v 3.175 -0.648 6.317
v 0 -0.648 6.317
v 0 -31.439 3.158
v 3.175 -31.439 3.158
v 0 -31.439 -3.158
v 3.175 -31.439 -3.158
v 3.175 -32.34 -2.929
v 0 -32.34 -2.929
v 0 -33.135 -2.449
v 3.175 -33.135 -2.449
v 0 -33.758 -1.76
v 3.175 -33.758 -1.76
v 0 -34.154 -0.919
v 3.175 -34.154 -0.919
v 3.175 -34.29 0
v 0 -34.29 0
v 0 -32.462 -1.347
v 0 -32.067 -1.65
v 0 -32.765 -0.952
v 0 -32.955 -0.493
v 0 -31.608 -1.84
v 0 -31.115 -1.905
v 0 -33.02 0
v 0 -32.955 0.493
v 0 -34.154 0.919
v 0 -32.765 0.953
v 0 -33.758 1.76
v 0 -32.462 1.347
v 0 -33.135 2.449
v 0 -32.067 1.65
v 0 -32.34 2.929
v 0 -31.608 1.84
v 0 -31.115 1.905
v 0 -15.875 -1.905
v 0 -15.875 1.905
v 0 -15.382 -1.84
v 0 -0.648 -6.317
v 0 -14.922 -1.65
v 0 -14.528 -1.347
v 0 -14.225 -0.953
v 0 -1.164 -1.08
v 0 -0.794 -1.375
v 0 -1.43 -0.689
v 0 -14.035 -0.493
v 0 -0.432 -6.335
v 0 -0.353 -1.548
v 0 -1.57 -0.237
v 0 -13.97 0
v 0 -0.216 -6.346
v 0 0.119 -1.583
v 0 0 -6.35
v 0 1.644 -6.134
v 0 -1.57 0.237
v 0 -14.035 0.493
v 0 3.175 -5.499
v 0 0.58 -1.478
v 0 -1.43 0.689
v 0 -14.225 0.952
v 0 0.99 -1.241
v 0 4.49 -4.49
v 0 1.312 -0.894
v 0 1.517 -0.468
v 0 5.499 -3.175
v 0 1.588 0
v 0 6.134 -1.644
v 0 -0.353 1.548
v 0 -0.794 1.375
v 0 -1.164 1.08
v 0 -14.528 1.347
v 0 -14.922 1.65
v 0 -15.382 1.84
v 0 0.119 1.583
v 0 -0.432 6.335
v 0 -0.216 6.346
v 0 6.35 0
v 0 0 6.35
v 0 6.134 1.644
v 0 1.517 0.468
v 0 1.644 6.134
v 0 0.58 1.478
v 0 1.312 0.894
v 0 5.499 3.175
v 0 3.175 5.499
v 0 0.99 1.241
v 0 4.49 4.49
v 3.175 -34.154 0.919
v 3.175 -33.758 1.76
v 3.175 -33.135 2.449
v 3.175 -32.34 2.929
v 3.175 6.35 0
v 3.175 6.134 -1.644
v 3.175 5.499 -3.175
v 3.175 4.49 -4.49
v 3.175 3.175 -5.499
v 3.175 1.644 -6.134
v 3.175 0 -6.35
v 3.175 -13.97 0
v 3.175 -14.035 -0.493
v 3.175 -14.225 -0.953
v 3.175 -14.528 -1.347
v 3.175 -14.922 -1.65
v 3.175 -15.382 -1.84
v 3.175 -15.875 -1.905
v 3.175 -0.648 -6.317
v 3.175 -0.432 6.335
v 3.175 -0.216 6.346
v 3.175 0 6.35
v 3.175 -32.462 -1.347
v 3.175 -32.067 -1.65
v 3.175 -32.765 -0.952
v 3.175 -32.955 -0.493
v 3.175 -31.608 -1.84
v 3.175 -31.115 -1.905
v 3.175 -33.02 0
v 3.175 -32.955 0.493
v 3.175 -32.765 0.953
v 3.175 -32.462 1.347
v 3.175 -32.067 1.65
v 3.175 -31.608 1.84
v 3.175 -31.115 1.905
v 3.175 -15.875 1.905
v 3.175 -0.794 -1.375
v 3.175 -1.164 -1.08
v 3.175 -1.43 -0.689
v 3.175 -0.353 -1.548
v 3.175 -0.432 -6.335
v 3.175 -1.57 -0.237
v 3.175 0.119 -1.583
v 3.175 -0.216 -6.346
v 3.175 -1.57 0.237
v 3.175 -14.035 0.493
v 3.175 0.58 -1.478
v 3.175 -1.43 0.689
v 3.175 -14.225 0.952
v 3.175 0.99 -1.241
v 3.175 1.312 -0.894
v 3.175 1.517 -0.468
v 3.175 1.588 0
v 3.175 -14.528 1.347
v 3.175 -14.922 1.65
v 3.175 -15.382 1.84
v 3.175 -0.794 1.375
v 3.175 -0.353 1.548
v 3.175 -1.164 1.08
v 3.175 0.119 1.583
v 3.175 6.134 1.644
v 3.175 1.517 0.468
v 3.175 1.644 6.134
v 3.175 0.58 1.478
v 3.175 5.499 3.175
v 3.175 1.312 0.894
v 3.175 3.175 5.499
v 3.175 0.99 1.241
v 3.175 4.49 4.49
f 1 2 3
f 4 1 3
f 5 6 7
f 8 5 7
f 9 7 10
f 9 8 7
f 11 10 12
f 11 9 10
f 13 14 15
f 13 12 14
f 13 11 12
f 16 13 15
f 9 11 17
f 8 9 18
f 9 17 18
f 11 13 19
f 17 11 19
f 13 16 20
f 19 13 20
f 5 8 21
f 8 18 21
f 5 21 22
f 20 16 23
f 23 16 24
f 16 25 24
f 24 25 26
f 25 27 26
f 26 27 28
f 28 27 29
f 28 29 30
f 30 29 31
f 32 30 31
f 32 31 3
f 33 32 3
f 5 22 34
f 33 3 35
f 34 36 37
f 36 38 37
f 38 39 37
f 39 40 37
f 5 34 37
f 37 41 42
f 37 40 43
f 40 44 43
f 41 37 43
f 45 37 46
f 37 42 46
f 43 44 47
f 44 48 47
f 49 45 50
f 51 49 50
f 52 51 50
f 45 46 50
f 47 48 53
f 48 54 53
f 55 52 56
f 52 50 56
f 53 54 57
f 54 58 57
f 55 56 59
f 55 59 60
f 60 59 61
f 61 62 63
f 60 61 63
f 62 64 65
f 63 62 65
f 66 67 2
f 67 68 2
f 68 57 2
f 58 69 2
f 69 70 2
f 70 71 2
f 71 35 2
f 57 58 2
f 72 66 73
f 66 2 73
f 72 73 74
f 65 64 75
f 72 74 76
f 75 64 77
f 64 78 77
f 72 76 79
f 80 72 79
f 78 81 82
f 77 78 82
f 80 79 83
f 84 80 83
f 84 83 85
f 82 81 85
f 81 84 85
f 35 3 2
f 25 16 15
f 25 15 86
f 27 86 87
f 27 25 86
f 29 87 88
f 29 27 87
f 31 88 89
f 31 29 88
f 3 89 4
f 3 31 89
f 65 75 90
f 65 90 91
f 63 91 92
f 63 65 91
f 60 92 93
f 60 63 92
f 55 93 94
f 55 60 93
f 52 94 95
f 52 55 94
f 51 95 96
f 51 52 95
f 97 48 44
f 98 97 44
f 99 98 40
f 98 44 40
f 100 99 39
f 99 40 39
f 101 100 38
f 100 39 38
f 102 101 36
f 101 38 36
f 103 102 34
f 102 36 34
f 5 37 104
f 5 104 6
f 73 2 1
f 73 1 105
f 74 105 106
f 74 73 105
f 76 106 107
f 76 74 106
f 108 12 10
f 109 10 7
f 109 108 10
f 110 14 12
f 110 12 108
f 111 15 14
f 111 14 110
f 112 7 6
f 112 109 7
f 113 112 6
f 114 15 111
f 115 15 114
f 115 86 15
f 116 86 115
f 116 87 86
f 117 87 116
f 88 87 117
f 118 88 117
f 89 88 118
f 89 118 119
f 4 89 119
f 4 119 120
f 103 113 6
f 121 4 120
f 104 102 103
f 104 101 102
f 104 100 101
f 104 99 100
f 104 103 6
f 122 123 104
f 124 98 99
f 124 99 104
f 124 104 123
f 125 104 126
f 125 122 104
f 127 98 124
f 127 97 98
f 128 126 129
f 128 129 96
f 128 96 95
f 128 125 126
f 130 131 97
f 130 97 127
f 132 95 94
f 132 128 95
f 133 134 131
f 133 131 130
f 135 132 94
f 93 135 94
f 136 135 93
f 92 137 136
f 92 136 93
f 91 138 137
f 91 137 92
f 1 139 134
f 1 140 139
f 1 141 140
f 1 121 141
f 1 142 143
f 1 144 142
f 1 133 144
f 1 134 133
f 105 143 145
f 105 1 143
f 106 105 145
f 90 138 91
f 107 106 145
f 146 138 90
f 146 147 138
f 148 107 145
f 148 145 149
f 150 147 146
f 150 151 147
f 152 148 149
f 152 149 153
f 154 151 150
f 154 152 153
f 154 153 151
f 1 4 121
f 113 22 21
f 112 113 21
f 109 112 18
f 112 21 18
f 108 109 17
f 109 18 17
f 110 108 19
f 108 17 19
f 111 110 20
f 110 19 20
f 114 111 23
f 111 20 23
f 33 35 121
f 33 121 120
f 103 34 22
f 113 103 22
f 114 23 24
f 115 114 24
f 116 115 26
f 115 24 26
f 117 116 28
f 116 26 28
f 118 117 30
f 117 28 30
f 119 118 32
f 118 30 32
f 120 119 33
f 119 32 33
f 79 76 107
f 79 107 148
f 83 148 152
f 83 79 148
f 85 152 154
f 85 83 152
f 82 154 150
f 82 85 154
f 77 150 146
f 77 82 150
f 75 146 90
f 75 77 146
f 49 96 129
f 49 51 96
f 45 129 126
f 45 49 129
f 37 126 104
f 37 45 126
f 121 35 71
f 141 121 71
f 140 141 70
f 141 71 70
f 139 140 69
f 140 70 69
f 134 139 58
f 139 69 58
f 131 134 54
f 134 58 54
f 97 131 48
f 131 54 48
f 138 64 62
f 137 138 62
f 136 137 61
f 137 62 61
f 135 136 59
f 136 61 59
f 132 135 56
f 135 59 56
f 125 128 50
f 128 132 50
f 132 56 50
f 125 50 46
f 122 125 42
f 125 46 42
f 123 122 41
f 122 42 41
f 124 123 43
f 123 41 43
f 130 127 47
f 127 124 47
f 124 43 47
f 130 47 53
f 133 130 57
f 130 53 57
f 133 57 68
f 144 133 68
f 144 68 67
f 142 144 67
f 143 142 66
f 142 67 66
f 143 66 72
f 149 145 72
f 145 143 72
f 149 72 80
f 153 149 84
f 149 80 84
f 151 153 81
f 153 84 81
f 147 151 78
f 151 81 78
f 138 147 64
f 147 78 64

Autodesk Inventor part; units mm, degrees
ref_plane "YZ Plane" through (0, 0, 0) normal (1, 0, 0) x (0, 1, 0)
ref_plane "XZ Plane" through (0, 0, 0) normal (0, 1, 0) x (-1, 0, 0)
ref_plane "XY Plane" through (0, 0, 0) normal (0, 0, 1) x (1, 0, 0)
sketch "Sketch2" plane through (0, 0, 0) normal (1, 0, 0) x (0, 1, 0)
  arc A0 (-0.648, -6.3169) -> (-0.648, 6.3169) centre (0, 0) ccw
  line L0 (6.35, 6.35) -> (-34.29, 6.35)
  line L1 (-34.29, 6.35) -> (-34.29, -6.35)
  line L2 (-34.29, -6.35) -> (6.35, -6.35)
  line L3 (6.35, -6.35) -> (6.35, 6.35)
  circle A1 centre (0, 0) radius 1.5875
  line L4 (-34.29, 0) -> (-33.02, 0)
  arc A2 (-31.115, 1.905) -> (-31.115, -1.905) centre (-31.115, 0) ccw
  arc A3 (-31.439, 3.1584) -> (-31.439, -3.1584) centre (-31.115, 0) ccw
  line L5 (-33.02, 0) -> (-13.97, 0)
  arc A4 (-15.875, -1.905) -> (-15.875, 1.905) centre (-15.875, 0) ccw
  line L6 (-15.875, -1.905) -> (-31.115, -1.905)
  line L7 (-15.875, 1.905) -> (-31.115, 1.905)
  line L8 (-0.648, -6.3169) -> (-31.439, -3.1584)
  line L9 (-0.648, 6.3169) -> (-31.439, 3.1584)
  dimension "d16" = 12.7
  dimension "d17" = 40.64
  dimension "d18" = 3.175
  dimension "d19" = 1.27
  dimension "d20" = 3.81
  dimension "d21" = 6.35
  dimension "d22" = 19.05
  dimension "d23" = 3.81
extrude "Extrusion3" add sketch "Sketch2" along normal blind 3.175 contours L8 A3 L9 A0
properties part number "CURM_Caterpillar_leg"
